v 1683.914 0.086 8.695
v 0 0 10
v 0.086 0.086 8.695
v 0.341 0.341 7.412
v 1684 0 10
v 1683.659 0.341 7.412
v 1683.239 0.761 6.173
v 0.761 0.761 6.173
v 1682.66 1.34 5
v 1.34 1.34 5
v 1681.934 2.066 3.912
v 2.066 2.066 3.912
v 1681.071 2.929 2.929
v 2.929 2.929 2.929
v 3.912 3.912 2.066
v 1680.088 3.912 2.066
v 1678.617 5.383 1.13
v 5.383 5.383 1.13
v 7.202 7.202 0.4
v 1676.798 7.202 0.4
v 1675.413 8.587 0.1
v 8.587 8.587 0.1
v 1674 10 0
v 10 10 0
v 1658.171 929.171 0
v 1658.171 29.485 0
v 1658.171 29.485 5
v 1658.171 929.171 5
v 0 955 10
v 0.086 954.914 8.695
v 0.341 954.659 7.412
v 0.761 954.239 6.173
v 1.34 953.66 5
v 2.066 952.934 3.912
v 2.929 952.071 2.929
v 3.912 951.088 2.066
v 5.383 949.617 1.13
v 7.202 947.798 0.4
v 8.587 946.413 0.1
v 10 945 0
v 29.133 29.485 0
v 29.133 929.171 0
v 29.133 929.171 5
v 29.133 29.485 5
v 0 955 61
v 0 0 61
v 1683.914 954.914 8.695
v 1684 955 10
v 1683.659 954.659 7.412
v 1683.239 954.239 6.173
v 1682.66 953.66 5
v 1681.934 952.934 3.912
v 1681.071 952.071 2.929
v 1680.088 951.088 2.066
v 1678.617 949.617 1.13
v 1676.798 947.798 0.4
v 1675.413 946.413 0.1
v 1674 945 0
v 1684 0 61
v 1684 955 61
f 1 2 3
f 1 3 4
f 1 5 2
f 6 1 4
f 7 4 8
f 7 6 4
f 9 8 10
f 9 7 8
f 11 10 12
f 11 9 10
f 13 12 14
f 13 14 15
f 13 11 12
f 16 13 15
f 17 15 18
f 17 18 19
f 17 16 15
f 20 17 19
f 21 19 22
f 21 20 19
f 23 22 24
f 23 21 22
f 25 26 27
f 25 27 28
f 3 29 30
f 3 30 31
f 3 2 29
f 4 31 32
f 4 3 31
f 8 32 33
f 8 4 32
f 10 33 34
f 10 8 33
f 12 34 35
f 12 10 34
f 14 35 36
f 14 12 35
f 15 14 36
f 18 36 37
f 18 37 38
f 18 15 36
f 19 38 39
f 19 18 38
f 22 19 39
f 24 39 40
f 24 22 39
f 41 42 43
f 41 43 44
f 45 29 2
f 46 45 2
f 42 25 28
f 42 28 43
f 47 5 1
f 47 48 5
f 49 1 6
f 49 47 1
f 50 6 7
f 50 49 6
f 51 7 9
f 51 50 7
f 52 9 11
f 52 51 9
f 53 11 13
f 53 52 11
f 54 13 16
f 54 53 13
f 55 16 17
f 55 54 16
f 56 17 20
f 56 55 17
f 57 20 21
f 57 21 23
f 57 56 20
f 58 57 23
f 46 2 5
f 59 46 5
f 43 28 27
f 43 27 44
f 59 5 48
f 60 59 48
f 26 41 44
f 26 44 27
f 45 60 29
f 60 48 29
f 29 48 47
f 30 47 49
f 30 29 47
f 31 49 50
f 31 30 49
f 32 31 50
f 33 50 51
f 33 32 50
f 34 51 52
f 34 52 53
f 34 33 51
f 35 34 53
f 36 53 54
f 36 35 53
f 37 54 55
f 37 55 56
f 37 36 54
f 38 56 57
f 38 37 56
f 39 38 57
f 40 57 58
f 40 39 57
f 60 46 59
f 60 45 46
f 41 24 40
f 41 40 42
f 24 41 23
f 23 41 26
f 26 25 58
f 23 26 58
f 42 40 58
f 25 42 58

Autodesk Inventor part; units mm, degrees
ref_plane "YZ Plane" through (0, 0, 0) normal (1, 0, 0) x (0, 1, 0)
ref_plane "XZ Plane" through (0, 0, 0) normal (0, 1, 0) x (-1, 0, 0)
ref_plane "XY Plane" through (0, 0, 0) normal (0, 0, 1) x (1, 0, 0)
sketch "Sketch1" plane through (0, 0, 0) normal (0, 0, 1) x (1, 0, 0)
  line L0 (0, 0) -> (1684, 0)
  line L1 (1684, 0) -> (1684, 955)
  line L2 (1684, 955) -> (0, 955)
  line L3 (0, 955) -> (0, 0)
  dimension "d0" = 1684
  dimension "d1" = 955
extrude "Extrusion1" add sketch "Sketch1" along normal blind 61
fillet "Fillet1" radius 10 4 edges at (0, 477.5, 0) (842, 955, 0) (842, 0, 0) (1684, 477.5, 0)
sketch "Sketch2" plane through (0, 0, 0) normal (0, 0, -1) x (-1, 0, 0)
  point P0 (0, 0)
sketch "Sketch3" plane through (0, 0, 0) normal (0, 0, -1) x (-1, 0, 0)
  line L0 (-1658.1713, 929.1713) -> (-29.133, 929.1713)
  line L1 (-29.133, 929.1713) -> (-29.133, 29.4852)
  line L2 (-29.133, 29.4852) -> (-1658.1713, 29.4852)
  line L3 (-1658.1713, 29.4852) -> (-1658.1713, 929.1713)
  point P0 (0, 0)
extrude "Extrusion2" cut sketch "Sketch3" against normal blind 5
properties part number "TV"
